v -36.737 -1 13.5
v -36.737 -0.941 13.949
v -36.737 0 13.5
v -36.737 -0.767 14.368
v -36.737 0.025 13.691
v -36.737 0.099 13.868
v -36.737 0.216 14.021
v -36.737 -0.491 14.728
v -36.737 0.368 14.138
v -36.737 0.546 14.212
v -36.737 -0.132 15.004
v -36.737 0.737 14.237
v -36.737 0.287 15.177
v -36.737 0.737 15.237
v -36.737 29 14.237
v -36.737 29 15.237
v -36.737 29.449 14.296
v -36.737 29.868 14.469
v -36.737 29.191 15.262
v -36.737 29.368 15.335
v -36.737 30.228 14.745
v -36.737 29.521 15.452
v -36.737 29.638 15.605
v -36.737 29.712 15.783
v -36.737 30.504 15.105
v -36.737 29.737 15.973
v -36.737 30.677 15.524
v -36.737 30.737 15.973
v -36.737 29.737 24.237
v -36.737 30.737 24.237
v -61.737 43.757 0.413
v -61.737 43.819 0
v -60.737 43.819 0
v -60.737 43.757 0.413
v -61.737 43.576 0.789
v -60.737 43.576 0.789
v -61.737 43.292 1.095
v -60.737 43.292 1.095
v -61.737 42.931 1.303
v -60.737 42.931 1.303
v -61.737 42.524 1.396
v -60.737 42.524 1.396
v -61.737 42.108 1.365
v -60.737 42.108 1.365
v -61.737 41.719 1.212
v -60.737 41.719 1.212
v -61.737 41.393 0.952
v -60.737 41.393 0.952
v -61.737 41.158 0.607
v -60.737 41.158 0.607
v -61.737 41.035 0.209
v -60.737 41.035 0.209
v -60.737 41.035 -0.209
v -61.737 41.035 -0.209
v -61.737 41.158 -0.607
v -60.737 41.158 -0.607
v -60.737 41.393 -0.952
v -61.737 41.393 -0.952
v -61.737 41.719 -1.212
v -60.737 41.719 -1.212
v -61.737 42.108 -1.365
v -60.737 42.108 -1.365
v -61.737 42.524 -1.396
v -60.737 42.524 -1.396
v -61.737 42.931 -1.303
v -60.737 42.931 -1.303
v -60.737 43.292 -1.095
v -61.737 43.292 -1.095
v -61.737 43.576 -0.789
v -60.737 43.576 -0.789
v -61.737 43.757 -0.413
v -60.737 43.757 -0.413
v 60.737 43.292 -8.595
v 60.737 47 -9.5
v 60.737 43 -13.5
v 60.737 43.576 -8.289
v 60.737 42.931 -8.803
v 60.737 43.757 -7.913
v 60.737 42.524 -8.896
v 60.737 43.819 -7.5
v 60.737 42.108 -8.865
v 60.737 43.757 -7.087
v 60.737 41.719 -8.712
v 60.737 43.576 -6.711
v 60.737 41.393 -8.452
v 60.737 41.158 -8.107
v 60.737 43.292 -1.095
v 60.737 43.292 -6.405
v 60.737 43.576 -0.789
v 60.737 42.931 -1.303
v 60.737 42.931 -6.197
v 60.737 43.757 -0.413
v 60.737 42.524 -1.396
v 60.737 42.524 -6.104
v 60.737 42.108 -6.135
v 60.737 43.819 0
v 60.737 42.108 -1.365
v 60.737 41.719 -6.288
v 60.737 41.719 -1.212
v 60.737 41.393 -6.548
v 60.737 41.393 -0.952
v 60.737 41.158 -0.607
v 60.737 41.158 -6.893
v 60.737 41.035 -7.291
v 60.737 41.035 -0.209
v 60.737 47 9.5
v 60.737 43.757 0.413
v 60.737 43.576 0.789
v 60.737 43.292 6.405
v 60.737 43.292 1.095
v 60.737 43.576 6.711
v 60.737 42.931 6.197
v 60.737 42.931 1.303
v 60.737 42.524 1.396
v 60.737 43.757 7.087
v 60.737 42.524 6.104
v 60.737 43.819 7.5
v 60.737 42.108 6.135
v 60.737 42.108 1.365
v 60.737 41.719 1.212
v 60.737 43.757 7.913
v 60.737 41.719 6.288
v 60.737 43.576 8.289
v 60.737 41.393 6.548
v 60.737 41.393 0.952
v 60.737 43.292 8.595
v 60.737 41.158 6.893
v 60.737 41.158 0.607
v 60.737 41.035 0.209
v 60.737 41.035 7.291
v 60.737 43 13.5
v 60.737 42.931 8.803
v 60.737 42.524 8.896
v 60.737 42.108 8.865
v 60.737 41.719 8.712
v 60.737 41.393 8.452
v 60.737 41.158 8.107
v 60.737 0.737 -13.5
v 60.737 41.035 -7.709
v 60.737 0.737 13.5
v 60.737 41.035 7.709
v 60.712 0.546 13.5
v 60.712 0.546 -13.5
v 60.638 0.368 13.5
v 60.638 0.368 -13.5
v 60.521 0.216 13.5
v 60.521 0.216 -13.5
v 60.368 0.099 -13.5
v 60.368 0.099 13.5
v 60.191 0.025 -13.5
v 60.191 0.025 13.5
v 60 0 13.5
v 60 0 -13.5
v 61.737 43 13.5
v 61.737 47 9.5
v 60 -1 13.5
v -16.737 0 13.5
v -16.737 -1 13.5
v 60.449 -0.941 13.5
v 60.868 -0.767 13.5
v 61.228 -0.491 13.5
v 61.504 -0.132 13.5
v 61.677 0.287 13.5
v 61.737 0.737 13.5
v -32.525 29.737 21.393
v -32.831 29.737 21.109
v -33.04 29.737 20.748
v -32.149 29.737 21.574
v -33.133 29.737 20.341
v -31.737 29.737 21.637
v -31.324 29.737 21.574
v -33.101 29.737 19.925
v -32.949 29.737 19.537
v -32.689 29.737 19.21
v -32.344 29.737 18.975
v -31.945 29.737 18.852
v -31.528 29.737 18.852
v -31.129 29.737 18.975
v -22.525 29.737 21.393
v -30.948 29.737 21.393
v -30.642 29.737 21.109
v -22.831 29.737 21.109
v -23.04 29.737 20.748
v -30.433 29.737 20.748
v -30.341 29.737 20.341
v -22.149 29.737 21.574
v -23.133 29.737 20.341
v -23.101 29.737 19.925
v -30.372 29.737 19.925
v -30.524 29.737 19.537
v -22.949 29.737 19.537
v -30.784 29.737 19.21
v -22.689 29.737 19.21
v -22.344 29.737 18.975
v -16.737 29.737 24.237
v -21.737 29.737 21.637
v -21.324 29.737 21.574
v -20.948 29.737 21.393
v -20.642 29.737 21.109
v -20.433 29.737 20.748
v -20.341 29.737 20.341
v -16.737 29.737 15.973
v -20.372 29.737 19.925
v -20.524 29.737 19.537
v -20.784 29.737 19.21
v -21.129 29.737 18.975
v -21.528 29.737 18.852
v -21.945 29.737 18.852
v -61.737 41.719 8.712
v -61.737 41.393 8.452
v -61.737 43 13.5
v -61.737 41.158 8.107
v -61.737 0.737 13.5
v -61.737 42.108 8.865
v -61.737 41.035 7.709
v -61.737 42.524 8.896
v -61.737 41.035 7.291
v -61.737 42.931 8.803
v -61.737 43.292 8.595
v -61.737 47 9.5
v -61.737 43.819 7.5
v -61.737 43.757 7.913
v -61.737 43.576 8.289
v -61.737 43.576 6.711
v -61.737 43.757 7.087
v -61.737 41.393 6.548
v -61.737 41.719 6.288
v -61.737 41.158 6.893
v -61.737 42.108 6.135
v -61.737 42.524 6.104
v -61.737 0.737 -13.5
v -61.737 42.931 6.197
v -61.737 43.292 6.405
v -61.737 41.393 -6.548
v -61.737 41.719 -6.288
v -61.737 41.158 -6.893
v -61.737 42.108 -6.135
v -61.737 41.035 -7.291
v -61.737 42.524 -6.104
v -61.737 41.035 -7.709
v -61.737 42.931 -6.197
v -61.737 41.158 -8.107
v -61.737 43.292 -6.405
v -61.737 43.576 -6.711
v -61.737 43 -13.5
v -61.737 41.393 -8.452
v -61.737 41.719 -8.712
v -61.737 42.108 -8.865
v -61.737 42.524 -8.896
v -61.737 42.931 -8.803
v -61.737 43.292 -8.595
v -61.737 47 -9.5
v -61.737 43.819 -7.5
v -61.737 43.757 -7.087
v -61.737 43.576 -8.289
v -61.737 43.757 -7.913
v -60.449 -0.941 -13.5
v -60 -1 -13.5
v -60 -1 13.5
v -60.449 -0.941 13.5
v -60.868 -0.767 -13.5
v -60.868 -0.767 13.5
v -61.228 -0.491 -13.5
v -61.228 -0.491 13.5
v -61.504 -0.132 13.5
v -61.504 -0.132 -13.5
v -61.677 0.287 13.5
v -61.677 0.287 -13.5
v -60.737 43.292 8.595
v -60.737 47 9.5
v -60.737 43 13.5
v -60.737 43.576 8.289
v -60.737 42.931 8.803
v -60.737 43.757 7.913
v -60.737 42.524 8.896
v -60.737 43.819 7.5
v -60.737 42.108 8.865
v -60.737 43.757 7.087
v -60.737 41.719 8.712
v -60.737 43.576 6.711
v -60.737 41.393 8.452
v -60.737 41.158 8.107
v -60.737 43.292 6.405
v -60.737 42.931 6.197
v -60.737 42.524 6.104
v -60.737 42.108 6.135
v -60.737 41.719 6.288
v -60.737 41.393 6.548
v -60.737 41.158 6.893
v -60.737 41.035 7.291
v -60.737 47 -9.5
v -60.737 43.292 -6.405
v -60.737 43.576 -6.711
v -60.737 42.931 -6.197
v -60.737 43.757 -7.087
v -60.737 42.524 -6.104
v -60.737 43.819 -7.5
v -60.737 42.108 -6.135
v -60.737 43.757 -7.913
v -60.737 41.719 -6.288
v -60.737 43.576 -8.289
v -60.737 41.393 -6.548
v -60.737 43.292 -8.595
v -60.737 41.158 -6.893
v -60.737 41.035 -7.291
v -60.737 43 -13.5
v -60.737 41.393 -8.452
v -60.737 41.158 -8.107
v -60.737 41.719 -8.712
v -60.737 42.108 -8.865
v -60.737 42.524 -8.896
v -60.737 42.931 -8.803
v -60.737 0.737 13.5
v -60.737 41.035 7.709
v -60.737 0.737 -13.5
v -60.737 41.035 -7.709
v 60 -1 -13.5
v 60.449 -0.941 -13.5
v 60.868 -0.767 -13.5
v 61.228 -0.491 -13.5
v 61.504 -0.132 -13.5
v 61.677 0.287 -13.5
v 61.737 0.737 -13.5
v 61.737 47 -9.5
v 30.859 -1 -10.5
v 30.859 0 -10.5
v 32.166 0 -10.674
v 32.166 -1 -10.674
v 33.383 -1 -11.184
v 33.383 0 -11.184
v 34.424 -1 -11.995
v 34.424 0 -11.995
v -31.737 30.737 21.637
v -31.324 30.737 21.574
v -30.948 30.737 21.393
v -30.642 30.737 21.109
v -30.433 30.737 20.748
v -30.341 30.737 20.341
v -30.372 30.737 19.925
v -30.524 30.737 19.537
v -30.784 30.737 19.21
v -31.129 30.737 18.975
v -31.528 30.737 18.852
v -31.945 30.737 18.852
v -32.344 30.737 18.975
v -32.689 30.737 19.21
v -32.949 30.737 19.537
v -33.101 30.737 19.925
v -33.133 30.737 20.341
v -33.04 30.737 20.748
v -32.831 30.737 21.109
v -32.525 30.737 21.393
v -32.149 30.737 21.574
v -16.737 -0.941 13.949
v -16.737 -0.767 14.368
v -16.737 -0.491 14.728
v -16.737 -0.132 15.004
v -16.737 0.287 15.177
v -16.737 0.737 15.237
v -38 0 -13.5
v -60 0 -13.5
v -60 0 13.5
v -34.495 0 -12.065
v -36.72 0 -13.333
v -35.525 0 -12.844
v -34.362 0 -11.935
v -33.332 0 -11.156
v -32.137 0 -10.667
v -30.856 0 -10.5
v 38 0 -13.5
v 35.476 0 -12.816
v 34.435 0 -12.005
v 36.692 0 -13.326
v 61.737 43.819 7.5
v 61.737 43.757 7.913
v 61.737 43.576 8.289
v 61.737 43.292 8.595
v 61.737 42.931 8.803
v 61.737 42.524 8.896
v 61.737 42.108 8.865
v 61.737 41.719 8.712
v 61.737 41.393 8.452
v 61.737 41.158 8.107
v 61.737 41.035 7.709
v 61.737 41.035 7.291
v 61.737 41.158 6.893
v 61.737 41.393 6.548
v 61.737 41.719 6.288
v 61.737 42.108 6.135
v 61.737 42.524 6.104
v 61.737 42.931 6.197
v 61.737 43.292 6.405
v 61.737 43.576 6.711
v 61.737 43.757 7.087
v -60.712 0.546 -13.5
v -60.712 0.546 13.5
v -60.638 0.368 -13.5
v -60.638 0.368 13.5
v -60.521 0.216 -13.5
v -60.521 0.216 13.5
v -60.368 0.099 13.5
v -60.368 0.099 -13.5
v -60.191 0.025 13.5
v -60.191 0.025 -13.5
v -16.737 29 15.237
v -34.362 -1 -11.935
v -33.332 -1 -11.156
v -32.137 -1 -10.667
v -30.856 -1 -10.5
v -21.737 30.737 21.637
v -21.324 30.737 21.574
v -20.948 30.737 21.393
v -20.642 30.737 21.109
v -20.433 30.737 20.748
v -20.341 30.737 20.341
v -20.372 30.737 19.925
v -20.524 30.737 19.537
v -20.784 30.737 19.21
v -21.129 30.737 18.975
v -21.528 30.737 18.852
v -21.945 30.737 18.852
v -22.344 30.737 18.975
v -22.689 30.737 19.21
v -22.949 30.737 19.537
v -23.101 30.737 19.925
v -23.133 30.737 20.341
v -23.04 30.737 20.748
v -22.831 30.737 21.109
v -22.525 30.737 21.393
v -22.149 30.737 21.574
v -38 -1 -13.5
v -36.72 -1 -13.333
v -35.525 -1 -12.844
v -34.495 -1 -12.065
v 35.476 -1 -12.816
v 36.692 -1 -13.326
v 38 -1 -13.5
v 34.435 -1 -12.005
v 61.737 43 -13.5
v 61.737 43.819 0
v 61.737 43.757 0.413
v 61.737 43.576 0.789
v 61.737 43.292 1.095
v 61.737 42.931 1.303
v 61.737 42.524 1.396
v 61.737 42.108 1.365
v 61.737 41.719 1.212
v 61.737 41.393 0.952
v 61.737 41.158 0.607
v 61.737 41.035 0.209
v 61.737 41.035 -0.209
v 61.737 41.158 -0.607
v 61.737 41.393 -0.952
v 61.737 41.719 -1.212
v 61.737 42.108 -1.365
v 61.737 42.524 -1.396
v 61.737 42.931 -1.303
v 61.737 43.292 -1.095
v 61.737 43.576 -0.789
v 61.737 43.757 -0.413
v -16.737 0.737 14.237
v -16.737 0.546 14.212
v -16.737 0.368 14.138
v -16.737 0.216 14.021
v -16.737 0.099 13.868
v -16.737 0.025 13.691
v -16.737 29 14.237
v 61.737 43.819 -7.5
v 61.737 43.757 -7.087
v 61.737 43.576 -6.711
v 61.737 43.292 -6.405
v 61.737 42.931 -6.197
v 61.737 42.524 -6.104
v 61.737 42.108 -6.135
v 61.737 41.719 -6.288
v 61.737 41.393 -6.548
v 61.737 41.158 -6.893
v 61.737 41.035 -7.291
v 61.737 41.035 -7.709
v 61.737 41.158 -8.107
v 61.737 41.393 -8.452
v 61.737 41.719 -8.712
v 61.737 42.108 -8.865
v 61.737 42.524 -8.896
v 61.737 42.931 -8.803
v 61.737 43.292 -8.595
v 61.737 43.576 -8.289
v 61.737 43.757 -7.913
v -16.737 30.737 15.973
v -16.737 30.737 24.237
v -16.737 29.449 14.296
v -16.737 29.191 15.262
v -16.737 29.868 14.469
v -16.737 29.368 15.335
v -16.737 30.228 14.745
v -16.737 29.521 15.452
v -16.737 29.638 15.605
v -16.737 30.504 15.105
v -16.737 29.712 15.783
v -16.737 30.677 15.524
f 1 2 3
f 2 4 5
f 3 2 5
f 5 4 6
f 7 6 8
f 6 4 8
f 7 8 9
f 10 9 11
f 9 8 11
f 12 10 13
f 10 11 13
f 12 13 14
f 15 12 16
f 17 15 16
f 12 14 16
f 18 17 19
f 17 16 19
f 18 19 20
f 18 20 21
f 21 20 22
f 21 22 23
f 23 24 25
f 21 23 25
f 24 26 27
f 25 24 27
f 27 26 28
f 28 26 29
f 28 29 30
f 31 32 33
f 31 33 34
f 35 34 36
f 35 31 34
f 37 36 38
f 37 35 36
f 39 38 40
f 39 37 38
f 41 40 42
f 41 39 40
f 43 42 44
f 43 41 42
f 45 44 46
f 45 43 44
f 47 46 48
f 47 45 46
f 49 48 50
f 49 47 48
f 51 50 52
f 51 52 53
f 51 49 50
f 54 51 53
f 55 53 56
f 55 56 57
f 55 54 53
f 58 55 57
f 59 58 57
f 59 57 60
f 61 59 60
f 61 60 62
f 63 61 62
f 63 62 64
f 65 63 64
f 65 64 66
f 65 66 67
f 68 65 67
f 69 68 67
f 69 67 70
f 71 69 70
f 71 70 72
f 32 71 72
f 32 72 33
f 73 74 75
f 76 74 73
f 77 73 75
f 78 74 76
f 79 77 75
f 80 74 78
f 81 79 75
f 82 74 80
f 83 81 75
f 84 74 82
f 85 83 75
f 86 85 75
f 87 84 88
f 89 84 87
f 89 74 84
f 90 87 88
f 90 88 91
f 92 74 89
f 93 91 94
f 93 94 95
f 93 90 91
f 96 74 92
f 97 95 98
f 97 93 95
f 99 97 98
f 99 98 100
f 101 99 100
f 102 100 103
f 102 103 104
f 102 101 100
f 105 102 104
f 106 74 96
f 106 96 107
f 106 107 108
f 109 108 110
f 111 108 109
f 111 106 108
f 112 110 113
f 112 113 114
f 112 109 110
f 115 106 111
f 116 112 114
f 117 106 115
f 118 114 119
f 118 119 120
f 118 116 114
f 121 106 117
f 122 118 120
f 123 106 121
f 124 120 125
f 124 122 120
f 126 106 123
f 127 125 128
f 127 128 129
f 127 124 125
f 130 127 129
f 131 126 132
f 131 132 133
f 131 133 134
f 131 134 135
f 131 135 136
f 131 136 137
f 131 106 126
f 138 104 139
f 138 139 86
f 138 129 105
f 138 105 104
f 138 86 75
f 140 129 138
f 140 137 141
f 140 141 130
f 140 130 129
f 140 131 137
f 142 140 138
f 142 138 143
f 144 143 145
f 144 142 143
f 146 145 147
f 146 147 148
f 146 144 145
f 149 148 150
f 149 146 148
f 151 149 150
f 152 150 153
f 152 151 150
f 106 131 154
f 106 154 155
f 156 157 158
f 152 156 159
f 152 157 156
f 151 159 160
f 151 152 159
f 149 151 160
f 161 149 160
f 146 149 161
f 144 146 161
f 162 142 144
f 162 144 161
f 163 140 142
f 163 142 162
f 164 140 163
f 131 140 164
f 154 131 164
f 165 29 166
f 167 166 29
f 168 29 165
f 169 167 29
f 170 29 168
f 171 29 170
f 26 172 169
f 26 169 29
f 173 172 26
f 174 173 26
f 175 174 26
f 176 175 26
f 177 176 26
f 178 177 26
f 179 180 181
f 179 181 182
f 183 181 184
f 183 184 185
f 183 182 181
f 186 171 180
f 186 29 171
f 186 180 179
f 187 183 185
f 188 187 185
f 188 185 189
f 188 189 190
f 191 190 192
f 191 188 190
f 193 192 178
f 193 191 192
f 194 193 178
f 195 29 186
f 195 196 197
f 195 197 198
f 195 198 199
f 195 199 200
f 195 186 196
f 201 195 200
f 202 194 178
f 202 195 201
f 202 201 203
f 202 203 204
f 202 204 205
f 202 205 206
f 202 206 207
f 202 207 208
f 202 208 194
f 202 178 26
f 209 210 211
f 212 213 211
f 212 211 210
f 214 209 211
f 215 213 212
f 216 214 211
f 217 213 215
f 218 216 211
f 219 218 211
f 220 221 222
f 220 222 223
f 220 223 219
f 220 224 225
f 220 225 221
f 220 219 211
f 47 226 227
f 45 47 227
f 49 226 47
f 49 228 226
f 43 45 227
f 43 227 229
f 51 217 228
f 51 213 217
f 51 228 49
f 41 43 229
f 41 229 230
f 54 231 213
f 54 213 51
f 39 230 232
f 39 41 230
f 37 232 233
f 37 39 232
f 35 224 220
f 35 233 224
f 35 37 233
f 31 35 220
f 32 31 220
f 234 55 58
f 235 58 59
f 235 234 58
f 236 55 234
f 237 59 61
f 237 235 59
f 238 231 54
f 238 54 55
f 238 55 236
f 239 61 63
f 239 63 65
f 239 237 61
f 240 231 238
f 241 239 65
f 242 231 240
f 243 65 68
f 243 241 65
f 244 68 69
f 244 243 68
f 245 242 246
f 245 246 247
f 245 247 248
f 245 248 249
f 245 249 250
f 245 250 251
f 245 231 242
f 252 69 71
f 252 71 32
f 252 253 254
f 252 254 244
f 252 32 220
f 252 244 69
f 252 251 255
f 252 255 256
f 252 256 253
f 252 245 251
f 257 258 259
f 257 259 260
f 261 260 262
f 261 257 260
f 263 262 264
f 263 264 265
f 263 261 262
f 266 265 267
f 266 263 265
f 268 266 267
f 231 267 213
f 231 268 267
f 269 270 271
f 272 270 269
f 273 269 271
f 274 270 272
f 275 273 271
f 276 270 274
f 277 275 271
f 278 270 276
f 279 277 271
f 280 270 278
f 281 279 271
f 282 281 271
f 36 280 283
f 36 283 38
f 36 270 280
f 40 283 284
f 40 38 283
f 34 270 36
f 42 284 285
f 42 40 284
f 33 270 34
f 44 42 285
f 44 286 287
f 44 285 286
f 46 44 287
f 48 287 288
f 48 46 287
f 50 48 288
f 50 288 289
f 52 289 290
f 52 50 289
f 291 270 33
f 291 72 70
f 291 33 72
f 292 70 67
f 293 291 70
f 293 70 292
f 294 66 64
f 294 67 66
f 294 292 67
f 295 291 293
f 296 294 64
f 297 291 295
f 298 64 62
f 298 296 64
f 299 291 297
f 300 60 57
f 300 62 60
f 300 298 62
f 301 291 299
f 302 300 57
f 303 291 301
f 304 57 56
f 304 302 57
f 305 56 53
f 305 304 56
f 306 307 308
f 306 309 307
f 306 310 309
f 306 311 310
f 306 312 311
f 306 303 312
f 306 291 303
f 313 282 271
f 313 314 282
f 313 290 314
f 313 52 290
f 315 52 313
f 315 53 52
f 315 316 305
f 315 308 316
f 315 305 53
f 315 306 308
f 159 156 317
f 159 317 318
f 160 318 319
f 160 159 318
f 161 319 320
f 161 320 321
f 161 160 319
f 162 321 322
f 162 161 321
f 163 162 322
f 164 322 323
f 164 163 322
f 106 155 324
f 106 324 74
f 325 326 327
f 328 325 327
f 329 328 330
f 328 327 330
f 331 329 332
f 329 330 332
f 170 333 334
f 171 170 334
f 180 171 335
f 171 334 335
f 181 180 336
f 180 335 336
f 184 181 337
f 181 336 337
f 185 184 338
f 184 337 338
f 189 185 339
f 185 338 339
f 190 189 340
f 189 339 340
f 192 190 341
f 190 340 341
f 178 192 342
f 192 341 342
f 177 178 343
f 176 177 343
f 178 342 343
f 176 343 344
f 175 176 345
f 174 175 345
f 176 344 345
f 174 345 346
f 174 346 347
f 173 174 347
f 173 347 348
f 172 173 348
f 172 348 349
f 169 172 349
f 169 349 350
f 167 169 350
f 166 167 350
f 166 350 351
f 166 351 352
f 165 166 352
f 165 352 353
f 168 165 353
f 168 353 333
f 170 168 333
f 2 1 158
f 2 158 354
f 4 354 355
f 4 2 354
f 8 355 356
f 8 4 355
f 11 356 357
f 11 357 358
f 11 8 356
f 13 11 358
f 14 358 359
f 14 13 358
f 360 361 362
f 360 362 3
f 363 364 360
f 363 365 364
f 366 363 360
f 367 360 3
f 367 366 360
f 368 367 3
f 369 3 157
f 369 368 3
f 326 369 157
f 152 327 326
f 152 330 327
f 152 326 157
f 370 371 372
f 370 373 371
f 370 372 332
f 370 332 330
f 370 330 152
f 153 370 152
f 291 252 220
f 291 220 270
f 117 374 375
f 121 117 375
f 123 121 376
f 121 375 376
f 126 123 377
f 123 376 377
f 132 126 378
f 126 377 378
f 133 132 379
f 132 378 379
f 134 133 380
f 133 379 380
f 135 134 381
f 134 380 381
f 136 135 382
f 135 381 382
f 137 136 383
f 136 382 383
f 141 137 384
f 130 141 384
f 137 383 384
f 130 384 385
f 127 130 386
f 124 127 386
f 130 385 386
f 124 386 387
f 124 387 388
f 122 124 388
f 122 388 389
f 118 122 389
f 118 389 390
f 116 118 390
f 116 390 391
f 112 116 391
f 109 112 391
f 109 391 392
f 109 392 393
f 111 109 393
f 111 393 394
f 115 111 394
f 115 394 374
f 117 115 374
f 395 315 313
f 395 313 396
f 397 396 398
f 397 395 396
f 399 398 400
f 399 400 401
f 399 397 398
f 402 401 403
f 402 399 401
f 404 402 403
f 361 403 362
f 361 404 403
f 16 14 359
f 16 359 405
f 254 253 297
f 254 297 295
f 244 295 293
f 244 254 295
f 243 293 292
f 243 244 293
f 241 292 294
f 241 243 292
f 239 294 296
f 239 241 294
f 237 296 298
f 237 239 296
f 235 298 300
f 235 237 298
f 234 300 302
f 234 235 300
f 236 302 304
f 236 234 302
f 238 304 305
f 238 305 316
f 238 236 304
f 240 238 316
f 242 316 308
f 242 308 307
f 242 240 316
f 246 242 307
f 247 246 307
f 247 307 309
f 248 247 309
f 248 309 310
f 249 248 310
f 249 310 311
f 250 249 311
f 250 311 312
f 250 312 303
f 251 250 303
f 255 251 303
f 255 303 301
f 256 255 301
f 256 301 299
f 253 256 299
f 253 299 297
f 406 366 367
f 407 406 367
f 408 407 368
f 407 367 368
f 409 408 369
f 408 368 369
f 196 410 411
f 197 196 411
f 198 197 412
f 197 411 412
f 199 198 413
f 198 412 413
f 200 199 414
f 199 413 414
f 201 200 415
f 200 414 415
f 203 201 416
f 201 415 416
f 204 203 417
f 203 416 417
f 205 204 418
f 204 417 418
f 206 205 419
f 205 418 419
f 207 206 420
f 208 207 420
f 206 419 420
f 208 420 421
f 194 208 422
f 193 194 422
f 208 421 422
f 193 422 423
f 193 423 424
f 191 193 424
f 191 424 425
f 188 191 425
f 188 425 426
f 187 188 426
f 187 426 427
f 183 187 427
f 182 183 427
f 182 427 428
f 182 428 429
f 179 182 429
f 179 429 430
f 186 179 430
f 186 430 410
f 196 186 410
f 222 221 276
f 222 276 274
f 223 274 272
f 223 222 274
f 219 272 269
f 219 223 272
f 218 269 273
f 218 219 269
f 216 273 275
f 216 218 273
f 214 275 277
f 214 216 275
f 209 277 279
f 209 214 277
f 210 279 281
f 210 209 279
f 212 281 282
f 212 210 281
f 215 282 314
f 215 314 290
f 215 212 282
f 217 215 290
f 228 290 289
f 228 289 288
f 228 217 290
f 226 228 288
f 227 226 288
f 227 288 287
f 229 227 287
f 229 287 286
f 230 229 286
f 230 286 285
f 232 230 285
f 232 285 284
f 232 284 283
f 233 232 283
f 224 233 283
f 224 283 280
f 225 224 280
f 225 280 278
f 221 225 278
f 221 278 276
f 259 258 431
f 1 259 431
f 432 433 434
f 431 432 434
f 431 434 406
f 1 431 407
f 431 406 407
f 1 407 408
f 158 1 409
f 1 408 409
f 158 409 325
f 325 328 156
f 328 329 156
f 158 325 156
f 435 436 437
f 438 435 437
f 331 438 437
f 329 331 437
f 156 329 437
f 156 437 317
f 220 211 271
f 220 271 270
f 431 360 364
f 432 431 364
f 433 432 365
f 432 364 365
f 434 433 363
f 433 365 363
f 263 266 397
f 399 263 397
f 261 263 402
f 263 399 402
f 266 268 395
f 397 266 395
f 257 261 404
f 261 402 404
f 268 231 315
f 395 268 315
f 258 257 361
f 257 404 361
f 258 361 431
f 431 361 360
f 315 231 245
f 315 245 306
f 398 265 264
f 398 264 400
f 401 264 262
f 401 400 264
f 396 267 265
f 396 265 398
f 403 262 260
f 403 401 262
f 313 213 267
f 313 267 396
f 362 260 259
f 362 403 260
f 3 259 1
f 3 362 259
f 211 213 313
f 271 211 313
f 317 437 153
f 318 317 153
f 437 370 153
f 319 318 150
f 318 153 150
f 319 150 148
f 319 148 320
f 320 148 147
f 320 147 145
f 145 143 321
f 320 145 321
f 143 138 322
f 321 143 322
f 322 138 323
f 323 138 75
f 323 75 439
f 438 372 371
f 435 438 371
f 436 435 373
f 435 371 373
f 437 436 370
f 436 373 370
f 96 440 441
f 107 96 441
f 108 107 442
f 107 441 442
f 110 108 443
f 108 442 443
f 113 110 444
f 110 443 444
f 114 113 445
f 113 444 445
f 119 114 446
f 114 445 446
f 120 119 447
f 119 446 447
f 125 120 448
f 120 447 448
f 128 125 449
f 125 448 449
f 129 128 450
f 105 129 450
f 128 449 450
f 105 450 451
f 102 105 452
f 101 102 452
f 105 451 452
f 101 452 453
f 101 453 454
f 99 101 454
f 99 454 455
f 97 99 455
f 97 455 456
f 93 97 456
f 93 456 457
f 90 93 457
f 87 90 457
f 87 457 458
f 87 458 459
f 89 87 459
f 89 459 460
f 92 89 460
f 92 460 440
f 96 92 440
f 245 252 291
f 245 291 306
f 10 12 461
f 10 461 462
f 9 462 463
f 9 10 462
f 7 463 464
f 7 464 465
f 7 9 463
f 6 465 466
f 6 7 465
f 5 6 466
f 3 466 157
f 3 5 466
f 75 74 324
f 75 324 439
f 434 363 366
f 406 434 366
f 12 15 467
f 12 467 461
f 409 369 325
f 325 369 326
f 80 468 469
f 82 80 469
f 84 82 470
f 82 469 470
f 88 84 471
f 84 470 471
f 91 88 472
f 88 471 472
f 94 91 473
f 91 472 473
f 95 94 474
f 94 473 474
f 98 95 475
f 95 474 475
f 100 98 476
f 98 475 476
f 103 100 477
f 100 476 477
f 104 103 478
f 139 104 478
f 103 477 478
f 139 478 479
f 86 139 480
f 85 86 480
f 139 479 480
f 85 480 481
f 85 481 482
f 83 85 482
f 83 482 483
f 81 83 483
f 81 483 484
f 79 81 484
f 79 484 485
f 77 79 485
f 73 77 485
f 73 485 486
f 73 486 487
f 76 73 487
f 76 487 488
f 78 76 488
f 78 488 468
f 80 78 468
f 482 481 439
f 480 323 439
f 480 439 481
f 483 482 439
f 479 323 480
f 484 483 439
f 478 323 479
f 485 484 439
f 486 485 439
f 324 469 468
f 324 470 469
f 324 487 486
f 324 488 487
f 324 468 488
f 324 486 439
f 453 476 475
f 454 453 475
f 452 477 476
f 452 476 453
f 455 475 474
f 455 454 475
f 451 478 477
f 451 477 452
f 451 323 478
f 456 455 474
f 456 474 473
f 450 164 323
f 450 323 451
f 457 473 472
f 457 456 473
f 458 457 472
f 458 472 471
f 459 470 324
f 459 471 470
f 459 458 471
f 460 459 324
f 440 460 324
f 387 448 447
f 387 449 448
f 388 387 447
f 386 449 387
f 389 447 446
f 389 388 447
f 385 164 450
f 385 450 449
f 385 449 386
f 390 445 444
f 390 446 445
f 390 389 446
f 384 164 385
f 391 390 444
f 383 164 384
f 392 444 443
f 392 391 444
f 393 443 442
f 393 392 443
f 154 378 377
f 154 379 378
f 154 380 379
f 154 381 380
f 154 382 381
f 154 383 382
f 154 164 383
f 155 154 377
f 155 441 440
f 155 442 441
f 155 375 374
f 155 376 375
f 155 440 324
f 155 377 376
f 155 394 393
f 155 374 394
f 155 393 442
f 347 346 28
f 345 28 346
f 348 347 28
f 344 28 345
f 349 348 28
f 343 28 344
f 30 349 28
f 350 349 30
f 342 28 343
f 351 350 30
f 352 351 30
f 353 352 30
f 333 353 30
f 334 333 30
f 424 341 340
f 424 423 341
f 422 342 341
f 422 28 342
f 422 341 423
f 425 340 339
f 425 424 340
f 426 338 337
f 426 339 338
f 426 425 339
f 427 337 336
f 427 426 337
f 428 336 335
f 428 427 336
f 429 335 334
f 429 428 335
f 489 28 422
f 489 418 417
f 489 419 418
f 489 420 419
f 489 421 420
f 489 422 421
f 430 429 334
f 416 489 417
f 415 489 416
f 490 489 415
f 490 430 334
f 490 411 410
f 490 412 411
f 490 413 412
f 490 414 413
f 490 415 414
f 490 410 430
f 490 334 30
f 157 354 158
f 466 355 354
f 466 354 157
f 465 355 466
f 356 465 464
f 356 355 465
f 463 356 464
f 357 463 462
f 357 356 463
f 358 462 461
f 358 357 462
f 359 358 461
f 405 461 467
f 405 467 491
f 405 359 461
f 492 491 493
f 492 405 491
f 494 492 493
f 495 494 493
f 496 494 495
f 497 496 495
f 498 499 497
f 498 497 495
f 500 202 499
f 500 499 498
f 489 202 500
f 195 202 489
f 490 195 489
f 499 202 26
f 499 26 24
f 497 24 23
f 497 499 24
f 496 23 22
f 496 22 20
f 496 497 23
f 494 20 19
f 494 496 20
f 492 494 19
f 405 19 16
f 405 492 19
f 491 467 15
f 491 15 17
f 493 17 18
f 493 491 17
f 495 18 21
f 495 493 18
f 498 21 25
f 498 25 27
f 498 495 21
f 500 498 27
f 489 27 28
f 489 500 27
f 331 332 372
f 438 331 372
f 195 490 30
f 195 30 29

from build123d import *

# Parameters (mm, degrees)
SKETCH6_W               = 120
SKETCH6_H               = 27
BASE_FLANGE2_DEPTH      = 1
EDGE_FLANGE1_DEPTH      = 27
EDGE_FLANGE1_BEND_DEPTH = 27
EDGE_FLANGE2_DEPTH      = 20
EDGE_FLANGE3_DEPTH      = 20
CUT_EXTRUDE1_REACH      = 136.321
SKETCH26_R              = 1.4
CUT_EXTRUDE2_REACH      = 75.526
SKETCH27_R              = 1.4
BREAK_CORNER1_START     = -61.7366
BREAK_CORNER1_DEPTH     = 123.4732
CUT_EXTRUDE3_REACH      = 83.289


# Read off the part's stored shape, not the designer's step: Break-Corner1
# Sheet-metal steps are written as plain solids
with BuildPart() as part:
    # Sketch6 → Base-Flange2 (new body)
    with BuildSketch(Plane(origin=(0, 0, 0), x_dir=(1, 0, 0), z_dir=(0, 1, 0))):
        Rectangle(SKETCH6_W, SKETCH6_H)
    extrude(amount=-BASE_FLANGE2_DEPTH)

    # Edge-Flange1 section (across the edge) → Edge-Flange1 (add)
    with BuildSketch(Plane(origin=(-60.7366, 0, -13.5), x_dir=(1, 0, 0), z_dir=(0, 0, 1))):
        with BuildLine():
            Line((-1, 0.7366), (-1, 47))
            Line((-1, 47), (0, 47))
            Line((0, 47), (0, 0.7366))
            ThreePointArc((0, 0.7366), (0.215745145, 0.215745145), (0.7366, 0))
            Line((0.7366, 0), (0.7366, -1))
            ThreePointArc((0.7366, -1), (-0.491361636, -0.491361636), (-1, 0.7366))
        make_face()
    extrude(amount=EDGE_FLANGE1_DEPTH)

    # Edge-Flange1 section 2 (across the edge) → Edge-Flange1 bend (add)
    with BuildSketch(Plane(origin=(60.7366, 0, 13.5), x_dir=(-1, 0, 0), z_dir=(0, 0, -1))):
        with BuildLine():
            Line((-1, 0.7366), (-1, 47))
            Line((-1, 47), (0, 47))
            Line((0, 47), (0, 0.7366))
            ThreePointArc((0, 0.7366), (0.215745145, 0.215745145), (0.7366, 0))
            Line((0.7366, 0), (0.7366, -1))
            ThreePointArc((0.7366, -1), (-0.491361636, -0.491361636), (-1, 0.7366))
        make_face()
    extrude(amount=EDGE_FLANGE1_BEND_DEPTH)

    # Edge-Flange2 section (across the edge) → Edge-Flange2 (add)
    with BuildSketch(Plane(origin=(-36.7366, 0, 14.2366), x_dir=(0, 0, -1), z_dir=(1, 0, 0))):
        with BuildLine():
            Line((-1, 0.7366), (-1, 29))
            Line((-1, 29), (0, 29))
            Line((0, 29), (0, 0.7366))
            ThreePointArc((0, 0.7366), (0.215745145, 0.215745145), (0.7366, 0))
            Line((0.7366, 0), (0.7366, -1))
            ThreePointArc((0.7366, -1), (-0.491361636, -0.491361636), (-1, 0.7366))
        make_face()
    extrude(amount=EDGE_FLANGE2_DEPTH)

    # Edge-Flange3 section (across the edge) → Edge-Flange3 (add)
    with BuildSketch(Plane(origin=(-16.7366, 29.7366, 15.2366), x_dir=(0, -1, 0), z_dir=(-1, 0, 0))):
        with BuildLine():
            Line((-1, 0.7366), (-1, 9))
            Line((-1, 9), (0, 9))
            Line((0, 9), (0, 0.7366))
            ThreePointArc((0, 0.7366), (0.215745145, 0.215745145), (0.7366, 0))
            Line((0.7366, 0), (0.7366, -1))
            ThreePointArc((0.7366, -1), (-0.491361636, -0.491361636), (-1, 0.7366))
        make_face()
    extrude(amount=EDGE_FLANGE3_DEPTH)

    # Sketch26 → Cut-Extrude1 (cut, up to next)
    with BuildSketch(Plane(origin=(61.7366, 0, 0), x_dir=(0, 0, -1), z_dir=(1, 0, 0)), mode=Mode.PRIVATE) as cut_extrude1_sk1:
        with Locations(Location((-7.5, 42.419132502, 0), (0, 0, 90))):
            Circle(SKETCH26_R)
    cut_extrude1_tool1 = extrude(cut_extrude1_sk1.sketch, amount=-CUT_EXTRUDE1_REACH, mode=Mode.PRIVATE) & part.part
    # Sketch26 → Cut-Extrude1 (cut, up to next)
    with BuildSketch(Plane(origin=(61.7366, 0, 0), x_dir=(0, 0, -1), z_dir=(1, 0, 0)), mode=Mode.PRIVATE) as cut_extrude1_sk2:
        with Locations(Location((0, 42.419132502, 0), (0, 0, 90))):
            Circle(SKETCH26_R)
    cut_extrude1_tool2 = extrude(cut_extrude1_sk2.sketch, amount=-CUT_EXTRUDE1_REACH, mode=Mode.PRIVATE) & part.part
    # Sketch26 → Cut-Extrude1 (cut, up to next)
    with BuildSketch(Plane(origin=(61.7366, 0, 0), x_dir=(0, 0, -1), z_dir=(1, 0, 0)), mode=Mode.PRIVATE) as cut_extrude1_sk3:
        with Locations(Location((7.5, 42.419132502, 0), (0, 0, 90))):
            Circle(SKETCH26_R)
    cut_extrude1_tool3 = extrude(cut_extrude1_sk3.sketch, amount=-CUT_EXTRUDE1_REACH, mode=Mode.PRIVATE) & part.part
    cut_extrude1_1 = cut_extrude1_tool1.solids().sort_by_distance((61.7366, 42.419133, 7.5))[0]
    add(cut_extrude1_1, mode=Mode.SUBTRACT)
    cut_extrude1_2 = cut_extrude1_tool2.solids().sort_by_distance((61.7366, 42.419133, 0))[0]
    add(cut_extrude1_2, mode=Mode.SUBTRACT)
    cut_extrude1_3 = cut_extrude1_tool3.solids().sort_by_distance((61.7366, 42.419133, -7.5))[0]
    add(cut_extrude1_3, mode=Mode.SUBTRACT)
    cut_extrude1 = cut_extrude1_1 + cut_extrude1_2 + cut_extrude1_3  # Cut-Extrude1 as one shape, for the pattern or mirror that repeats it

    # Mirror1: Cut-Extrude1 across plane
    add(cut_extrude1.mirror(Plane(origin=(0, 0, 0), x_dir=(0, 0, 1), z_dir=(1, 0, 0))), mode=Mode.SUBTRACT)

    # Sketch27 → Cut-Extrude2 (cut, up to next)
    with BuildSketch(Plane(origin=(0, 30.7366, 0), x_dir=(1, 0, 0), z_dir=(0, 1, 0)), mode=Mode.PRIVATE) as cut_extrude2_sk1:
        with Locations(Location((-31.7366, -20.2366, 0), (0, 0, 270))):
            Circle(SKETCH27_R)
    cut_extrude2_tool1 = extrude(cut_extrude2_sk1.sketch, amount=-CUT_EXTRUDE2_REACH, mode=Mode.PRIVATE) & part.part
    # Sketch27 → Cut-Extrude2 (cut, up to next)
    with BuildSketch(Plane(origin=(0, 30.7366, 0), x_dir=(1, 0, 0), z_dir=(0, 1, 0)), mode=Mode.PRIVATE) as cut_extrude2_sk2:
        with Locations(Location((-21.7366, -20.2366, 0), (0, 0, 270))):
            Circle(SKETCH27_R)
    cut_extrude2_tool2 = extrude(cut_extrude2_sk2.sketch, amount=-CUT_EXTRUDE2_REACH, mode=Mode.PRIVATE) & part.part
    add(cut_extrude2_tool1.solids().sort_by_distance((-31.7366, 30.7366, 20.2366))[0], mode=Mode.SUBTRACT)
    add(cut_extrude2_tool2.solids().sort_by_distance((-21.7366, 30.7366, 20.2366))[0], mode=Mode.SUBTRACT)

    # Break-Corner1 outline → Break-Corner1 (cut)
    with BuildSketch(Plane.YZ.offset(BREAK_CORNER1_START)):
        Polygon((47, -13.5), (47, -9.5), (43, -13.5), align=None)
        Polygon((43, 13.5), (47, 9.5), (47, 13.5), align=None)
    extrude(amount=BREAK_CORNER1_DEPTH, mode=Mode.SUBTRACT)

    # Sketch29 → Cut-Extrude3 (cut, up to next)
    with BuildSketch(Plane(origin=(0, 0, 0), x_dir=(1, 0, 0), z_dir=(0, 1, 0)), mode=Mode.PRIVATE) as cut_extrude3_sk1:
        with BuildLine():
            Line((-34.494615607, 12.065428481), (-34.361517182, 11.934571519))
            ThreePointArc((-34.361517182, 11.934571519), (-32.749919682, 10.872519994), (-30.856132789, 10.5))
            Line((-30.856132789, 10.5), (30.858555604, 10.5))
            ThreePointArc((30.858555604, 10.5), (32.791568542, 10.888767954), (34.423984085, 11.994615607))
            Line((34.423984085, 11.994615607), (34.434571519, 12.005384393))
            ThreePointArc((34.434571519, 12.005384393), (36.066987062, 13.111232046), (38, 13.5))
            Line((38, 13.5), (-38, 13.5))
            ThreePointArc((-38, 13.5), (-36.106213107, 13.127480006), (-34.494615607, 12.065428481))
        make_face()
    cut_extrude3_tool1 = extrude(cut_extrude3_sk1.sketch, amount=-CUT_EXTRUDE3_REACH, mode=Mode.PRIVATE) & part.part
    add(cut_extrude3_tool1.solids().sort_by_distance((0.000586, 0, -12.034279))[0], mode=Mode.SUBTRACT)


solid = part.part
